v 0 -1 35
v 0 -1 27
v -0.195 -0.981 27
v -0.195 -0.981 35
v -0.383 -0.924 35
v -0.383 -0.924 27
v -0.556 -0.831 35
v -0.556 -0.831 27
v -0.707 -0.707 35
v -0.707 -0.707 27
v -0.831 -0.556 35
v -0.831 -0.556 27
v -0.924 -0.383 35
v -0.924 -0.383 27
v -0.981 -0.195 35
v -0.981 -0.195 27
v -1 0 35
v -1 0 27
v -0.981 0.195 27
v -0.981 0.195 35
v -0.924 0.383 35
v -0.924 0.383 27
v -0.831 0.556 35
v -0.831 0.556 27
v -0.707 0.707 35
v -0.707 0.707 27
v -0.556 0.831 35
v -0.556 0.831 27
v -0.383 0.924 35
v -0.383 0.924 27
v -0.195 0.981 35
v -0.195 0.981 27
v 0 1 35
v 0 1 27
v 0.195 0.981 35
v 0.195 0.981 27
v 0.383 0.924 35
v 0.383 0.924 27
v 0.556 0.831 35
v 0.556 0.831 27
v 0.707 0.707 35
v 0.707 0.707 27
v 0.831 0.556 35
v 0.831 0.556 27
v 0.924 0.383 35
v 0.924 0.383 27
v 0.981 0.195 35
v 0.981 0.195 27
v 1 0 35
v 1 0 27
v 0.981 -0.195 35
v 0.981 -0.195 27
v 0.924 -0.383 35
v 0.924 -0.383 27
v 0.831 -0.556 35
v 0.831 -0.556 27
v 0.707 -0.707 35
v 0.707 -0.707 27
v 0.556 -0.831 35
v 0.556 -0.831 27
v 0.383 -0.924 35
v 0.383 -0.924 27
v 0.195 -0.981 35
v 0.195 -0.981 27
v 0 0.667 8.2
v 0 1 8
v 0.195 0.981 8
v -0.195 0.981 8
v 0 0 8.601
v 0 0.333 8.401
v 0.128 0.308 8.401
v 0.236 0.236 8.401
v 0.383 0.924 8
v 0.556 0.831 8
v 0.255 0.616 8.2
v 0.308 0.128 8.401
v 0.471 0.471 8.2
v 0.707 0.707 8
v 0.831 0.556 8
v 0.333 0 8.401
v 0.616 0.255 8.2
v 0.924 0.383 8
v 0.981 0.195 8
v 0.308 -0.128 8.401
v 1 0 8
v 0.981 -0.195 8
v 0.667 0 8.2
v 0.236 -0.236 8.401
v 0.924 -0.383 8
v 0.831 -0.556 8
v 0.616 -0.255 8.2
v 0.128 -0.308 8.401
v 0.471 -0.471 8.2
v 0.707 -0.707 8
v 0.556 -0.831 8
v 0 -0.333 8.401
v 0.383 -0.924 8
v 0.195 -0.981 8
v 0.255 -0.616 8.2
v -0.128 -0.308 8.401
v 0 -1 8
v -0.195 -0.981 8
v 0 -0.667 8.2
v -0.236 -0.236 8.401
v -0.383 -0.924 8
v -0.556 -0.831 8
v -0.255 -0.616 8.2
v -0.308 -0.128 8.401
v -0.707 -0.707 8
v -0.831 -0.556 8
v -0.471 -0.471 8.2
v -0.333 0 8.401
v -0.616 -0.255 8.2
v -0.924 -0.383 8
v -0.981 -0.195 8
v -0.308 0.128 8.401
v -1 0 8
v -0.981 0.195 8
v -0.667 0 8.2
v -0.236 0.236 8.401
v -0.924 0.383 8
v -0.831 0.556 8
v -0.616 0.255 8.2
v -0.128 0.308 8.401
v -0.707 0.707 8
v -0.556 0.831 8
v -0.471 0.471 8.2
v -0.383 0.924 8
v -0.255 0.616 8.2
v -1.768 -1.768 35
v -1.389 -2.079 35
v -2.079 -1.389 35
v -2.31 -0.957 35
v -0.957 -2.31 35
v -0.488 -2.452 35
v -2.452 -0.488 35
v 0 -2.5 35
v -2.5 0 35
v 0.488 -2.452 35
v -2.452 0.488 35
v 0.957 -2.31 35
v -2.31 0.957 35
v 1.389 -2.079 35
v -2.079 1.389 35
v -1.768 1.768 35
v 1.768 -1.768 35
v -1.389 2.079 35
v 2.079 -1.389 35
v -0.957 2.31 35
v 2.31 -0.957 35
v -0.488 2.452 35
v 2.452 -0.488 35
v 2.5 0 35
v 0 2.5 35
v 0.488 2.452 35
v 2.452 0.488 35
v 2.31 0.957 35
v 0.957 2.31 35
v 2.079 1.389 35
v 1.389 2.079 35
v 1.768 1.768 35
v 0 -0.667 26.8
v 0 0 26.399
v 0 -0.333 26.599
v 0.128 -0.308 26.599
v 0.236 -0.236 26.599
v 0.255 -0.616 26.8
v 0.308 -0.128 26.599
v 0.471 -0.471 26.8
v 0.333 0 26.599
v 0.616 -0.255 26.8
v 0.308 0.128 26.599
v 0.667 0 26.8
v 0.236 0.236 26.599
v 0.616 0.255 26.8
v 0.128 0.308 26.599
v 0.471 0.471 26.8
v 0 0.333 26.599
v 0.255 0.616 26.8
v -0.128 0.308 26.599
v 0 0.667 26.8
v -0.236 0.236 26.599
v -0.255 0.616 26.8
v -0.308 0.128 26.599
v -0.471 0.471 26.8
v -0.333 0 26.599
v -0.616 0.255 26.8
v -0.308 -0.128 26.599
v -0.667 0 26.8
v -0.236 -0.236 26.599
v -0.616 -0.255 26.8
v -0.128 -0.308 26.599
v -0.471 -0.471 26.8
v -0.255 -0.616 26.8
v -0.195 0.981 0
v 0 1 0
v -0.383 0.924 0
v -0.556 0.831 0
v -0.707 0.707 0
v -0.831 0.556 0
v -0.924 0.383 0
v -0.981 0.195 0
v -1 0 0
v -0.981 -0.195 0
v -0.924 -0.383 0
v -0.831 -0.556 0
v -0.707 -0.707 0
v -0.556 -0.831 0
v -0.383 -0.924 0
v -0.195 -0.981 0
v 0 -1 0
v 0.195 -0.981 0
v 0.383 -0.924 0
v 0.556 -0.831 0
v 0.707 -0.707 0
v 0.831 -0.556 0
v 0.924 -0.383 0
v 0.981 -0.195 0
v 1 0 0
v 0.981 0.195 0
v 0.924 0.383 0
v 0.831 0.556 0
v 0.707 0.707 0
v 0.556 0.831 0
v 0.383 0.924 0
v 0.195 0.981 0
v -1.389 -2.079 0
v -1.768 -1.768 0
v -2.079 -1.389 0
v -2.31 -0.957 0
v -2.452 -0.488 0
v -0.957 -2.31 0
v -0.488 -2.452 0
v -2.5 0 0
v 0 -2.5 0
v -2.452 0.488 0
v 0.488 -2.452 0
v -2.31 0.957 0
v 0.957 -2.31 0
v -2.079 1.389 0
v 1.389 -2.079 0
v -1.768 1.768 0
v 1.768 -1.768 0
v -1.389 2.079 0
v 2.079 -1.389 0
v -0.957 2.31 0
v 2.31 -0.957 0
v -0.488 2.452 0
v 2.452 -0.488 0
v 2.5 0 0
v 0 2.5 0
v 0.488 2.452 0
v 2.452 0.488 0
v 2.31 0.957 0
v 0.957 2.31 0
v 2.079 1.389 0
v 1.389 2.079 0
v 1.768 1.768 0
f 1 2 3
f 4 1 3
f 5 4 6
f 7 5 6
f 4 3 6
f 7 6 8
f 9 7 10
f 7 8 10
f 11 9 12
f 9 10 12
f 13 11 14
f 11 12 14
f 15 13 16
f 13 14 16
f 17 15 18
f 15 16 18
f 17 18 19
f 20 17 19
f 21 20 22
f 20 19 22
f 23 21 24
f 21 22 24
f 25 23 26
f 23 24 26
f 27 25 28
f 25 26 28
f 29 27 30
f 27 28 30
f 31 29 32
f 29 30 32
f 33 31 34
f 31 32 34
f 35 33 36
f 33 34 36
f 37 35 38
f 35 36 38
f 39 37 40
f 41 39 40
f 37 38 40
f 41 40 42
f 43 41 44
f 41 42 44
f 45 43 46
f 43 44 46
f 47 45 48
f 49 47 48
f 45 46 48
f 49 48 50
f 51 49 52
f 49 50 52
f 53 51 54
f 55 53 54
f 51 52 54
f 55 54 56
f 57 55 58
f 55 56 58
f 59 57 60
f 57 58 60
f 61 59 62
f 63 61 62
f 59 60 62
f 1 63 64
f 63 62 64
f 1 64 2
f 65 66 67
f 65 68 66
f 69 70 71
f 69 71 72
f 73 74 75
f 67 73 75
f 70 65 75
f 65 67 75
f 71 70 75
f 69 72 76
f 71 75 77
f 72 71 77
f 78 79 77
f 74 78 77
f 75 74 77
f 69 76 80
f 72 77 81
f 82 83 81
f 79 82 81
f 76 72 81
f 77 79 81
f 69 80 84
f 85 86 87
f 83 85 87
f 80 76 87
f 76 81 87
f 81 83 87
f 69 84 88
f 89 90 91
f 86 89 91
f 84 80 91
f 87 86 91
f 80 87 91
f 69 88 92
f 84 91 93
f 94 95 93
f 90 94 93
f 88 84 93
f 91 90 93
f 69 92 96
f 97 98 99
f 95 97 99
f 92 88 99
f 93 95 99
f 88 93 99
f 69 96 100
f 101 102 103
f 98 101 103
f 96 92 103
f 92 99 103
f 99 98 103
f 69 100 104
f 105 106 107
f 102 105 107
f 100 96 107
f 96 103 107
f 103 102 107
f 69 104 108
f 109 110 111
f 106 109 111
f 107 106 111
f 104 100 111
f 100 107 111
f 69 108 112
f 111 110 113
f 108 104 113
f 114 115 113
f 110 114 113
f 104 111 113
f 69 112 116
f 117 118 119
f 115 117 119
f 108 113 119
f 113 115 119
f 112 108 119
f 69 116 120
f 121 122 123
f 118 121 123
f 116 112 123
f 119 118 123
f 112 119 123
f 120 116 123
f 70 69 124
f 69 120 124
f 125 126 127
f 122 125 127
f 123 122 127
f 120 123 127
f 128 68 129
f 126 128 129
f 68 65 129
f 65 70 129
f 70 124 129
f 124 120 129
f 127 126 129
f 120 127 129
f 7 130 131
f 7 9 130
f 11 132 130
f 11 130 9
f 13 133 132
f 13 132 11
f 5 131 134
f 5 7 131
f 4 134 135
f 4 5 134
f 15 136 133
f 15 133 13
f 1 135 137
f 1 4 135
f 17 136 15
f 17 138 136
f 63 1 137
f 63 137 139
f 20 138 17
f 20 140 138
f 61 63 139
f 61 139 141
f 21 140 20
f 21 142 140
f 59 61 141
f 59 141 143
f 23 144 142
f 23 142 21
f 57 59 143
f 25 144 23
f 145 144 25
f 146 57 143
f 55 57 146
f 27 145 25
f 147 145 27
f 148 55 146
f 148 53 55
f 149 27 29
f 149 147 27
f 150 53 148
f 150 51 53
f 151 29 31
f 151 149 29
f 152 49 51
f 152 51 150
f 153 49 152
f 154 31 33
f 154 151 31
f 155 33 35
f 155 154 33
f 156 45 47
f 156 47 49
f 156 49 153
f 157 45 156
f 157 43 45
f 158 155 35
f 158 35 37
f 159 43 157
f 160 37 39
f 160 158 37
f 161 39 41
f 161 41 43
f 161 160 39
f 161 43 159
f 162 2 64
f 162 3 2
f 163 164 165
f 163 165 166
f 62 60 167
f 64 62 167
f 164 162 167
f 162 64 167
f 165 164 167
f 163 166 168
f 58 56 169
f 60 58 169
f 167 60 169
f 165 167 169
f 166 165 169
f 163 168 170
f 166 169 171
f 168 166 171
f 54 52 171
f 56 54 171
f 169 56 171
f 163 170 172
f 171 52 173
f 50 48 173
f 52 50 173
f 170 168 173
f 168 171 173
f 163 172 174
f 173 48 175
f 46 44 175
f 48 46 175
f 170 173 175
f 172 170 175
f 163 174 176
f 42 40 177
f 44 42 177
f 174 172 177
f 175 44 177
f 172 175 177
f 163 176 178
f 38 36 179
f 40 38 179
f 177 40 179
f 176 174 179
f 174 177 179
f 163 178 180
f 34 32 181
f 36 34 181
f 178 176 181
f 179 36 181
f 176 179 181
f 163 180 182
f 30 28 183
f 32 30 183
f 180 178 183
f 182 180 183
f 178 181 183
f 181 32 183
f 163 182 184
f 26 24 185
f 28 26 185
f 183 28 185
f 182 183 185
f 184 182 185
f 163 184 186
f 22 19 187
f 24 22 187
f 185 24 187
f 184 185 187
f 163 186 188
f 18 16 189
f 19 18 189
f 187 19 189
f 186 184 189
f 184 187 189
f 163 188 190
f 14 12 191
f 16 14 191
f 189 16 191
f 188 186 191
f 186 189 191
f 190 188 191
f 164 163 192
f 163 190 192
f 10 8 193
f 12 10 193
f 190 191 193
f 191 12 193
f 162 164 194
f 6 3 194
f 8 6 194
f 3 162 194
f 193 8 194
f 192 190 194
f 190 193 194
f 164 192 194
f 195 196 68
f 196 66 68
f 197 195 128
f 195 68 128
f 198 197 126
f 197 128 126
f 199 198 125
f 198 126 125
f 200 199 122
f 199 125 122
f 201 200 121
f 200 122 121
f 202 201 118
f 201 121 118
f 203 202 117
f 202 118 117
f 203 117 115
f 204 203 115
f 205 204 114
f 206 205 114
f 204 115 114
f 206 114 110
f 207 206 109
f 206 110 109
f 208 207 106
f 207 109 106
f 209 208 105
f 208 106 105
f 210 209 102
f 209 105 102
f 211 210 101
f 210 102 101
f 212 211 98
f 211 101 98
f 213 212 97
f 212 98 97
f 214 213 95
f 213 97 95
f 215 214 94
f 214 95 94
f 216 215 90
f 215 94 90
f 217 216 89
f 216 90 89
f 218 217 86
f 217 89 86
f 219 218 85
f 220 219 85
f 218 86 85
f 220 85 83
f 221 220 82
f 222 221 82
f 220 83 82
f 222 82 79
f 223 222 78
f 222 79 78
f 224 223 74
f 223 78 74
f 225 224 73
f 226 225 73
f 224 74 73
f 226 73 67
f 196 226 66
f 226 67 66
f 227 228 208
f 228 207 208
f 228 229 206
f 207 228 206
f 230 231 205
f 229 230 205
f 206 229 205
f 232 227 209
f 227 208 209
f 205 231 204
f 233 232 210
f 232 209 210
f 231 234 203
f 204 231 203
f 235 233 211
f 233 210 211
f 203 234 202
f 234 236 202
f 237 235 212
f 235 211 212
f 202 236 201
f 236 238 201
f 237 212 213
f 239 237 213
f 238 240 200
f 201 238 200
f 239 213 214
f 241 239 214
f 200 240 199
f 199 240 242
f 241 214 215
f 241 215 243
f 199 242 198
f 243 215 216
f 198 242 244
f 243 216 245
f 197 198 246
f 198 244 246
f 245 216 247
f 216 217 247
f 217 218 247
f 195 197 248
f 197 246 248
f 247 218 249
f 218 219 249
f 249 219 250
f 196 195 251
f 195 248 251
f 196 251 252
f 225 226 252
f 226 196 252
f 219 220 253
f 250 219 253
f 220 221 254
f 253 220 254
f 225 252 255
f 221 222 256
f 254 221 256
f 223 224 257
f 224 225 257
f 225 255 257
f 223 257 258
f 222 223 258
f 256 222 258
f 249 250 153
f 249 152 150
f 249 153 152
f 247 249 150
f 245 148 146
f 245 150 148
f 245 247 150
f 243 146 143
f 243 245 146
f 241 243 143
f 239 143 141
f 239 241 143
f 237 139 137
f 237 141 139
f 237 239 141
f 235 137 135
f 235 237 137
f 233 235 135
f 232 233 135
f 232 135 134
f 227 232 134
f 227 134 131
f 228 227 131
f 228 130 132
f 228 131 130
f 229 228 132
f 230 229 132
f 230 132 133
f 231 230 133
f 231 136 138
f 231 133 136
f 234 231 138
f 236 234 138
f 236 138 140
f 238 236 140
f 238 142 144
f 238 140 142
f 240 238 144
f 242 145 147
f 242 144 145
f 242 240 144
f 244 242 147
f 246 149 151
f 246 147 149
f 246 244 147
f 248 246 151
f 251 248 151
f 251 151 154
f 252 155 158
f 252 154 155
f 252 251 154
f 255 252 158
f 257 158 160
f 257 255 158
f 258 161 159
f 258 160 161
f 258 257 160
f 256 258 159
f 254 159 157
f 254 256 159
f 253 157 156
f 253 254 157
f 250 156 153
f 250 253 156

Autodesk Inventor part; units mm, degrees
ref_plane "YZ Plane" through (0, 0, 0) normal (1, 0, 0) x (0, 1, 0)
ref_plane "XZ Plane" through (0, 0, 0) normal (0, 1, 0) x (-1, 0, 0)
ref_plane "XY Plane" through (0, 0, 0) normal (0, 0, 1) x (1, 0, 0)
sketch "Esquisse1" plane through (0, 0, 0) normal (0, 0, 1) x (1, 0, 0)
  circle A0 centre (0, 0) radius 2.5
  dimension "d0" = 5
extrude "Extrusion1" add sketch "Esquisse1" along normal blind 35
sketch "Esquisse2" plane through (0, 0, 35) normal (0, 0, 1) x (1, 0, 0)
  point P0 (0, 0)
  point P1 (0, 0)
sketch "Esquisse3" plane through (0, 0, 0) normal (0, 0, -1) x (-1, 0, 0)
  point P0 (0, 0)
  point P1 (0, 0)
hole "Perçage1" at (0, 0, 0) direction (0, 0, 1) diameter 2 depth 8 tip angle 118
hole "Perçage2" at (0, 0, 35) direction (0, 0, -1) diameter 2 depth 8 tip angle 118
properties part number "elevateur support"
